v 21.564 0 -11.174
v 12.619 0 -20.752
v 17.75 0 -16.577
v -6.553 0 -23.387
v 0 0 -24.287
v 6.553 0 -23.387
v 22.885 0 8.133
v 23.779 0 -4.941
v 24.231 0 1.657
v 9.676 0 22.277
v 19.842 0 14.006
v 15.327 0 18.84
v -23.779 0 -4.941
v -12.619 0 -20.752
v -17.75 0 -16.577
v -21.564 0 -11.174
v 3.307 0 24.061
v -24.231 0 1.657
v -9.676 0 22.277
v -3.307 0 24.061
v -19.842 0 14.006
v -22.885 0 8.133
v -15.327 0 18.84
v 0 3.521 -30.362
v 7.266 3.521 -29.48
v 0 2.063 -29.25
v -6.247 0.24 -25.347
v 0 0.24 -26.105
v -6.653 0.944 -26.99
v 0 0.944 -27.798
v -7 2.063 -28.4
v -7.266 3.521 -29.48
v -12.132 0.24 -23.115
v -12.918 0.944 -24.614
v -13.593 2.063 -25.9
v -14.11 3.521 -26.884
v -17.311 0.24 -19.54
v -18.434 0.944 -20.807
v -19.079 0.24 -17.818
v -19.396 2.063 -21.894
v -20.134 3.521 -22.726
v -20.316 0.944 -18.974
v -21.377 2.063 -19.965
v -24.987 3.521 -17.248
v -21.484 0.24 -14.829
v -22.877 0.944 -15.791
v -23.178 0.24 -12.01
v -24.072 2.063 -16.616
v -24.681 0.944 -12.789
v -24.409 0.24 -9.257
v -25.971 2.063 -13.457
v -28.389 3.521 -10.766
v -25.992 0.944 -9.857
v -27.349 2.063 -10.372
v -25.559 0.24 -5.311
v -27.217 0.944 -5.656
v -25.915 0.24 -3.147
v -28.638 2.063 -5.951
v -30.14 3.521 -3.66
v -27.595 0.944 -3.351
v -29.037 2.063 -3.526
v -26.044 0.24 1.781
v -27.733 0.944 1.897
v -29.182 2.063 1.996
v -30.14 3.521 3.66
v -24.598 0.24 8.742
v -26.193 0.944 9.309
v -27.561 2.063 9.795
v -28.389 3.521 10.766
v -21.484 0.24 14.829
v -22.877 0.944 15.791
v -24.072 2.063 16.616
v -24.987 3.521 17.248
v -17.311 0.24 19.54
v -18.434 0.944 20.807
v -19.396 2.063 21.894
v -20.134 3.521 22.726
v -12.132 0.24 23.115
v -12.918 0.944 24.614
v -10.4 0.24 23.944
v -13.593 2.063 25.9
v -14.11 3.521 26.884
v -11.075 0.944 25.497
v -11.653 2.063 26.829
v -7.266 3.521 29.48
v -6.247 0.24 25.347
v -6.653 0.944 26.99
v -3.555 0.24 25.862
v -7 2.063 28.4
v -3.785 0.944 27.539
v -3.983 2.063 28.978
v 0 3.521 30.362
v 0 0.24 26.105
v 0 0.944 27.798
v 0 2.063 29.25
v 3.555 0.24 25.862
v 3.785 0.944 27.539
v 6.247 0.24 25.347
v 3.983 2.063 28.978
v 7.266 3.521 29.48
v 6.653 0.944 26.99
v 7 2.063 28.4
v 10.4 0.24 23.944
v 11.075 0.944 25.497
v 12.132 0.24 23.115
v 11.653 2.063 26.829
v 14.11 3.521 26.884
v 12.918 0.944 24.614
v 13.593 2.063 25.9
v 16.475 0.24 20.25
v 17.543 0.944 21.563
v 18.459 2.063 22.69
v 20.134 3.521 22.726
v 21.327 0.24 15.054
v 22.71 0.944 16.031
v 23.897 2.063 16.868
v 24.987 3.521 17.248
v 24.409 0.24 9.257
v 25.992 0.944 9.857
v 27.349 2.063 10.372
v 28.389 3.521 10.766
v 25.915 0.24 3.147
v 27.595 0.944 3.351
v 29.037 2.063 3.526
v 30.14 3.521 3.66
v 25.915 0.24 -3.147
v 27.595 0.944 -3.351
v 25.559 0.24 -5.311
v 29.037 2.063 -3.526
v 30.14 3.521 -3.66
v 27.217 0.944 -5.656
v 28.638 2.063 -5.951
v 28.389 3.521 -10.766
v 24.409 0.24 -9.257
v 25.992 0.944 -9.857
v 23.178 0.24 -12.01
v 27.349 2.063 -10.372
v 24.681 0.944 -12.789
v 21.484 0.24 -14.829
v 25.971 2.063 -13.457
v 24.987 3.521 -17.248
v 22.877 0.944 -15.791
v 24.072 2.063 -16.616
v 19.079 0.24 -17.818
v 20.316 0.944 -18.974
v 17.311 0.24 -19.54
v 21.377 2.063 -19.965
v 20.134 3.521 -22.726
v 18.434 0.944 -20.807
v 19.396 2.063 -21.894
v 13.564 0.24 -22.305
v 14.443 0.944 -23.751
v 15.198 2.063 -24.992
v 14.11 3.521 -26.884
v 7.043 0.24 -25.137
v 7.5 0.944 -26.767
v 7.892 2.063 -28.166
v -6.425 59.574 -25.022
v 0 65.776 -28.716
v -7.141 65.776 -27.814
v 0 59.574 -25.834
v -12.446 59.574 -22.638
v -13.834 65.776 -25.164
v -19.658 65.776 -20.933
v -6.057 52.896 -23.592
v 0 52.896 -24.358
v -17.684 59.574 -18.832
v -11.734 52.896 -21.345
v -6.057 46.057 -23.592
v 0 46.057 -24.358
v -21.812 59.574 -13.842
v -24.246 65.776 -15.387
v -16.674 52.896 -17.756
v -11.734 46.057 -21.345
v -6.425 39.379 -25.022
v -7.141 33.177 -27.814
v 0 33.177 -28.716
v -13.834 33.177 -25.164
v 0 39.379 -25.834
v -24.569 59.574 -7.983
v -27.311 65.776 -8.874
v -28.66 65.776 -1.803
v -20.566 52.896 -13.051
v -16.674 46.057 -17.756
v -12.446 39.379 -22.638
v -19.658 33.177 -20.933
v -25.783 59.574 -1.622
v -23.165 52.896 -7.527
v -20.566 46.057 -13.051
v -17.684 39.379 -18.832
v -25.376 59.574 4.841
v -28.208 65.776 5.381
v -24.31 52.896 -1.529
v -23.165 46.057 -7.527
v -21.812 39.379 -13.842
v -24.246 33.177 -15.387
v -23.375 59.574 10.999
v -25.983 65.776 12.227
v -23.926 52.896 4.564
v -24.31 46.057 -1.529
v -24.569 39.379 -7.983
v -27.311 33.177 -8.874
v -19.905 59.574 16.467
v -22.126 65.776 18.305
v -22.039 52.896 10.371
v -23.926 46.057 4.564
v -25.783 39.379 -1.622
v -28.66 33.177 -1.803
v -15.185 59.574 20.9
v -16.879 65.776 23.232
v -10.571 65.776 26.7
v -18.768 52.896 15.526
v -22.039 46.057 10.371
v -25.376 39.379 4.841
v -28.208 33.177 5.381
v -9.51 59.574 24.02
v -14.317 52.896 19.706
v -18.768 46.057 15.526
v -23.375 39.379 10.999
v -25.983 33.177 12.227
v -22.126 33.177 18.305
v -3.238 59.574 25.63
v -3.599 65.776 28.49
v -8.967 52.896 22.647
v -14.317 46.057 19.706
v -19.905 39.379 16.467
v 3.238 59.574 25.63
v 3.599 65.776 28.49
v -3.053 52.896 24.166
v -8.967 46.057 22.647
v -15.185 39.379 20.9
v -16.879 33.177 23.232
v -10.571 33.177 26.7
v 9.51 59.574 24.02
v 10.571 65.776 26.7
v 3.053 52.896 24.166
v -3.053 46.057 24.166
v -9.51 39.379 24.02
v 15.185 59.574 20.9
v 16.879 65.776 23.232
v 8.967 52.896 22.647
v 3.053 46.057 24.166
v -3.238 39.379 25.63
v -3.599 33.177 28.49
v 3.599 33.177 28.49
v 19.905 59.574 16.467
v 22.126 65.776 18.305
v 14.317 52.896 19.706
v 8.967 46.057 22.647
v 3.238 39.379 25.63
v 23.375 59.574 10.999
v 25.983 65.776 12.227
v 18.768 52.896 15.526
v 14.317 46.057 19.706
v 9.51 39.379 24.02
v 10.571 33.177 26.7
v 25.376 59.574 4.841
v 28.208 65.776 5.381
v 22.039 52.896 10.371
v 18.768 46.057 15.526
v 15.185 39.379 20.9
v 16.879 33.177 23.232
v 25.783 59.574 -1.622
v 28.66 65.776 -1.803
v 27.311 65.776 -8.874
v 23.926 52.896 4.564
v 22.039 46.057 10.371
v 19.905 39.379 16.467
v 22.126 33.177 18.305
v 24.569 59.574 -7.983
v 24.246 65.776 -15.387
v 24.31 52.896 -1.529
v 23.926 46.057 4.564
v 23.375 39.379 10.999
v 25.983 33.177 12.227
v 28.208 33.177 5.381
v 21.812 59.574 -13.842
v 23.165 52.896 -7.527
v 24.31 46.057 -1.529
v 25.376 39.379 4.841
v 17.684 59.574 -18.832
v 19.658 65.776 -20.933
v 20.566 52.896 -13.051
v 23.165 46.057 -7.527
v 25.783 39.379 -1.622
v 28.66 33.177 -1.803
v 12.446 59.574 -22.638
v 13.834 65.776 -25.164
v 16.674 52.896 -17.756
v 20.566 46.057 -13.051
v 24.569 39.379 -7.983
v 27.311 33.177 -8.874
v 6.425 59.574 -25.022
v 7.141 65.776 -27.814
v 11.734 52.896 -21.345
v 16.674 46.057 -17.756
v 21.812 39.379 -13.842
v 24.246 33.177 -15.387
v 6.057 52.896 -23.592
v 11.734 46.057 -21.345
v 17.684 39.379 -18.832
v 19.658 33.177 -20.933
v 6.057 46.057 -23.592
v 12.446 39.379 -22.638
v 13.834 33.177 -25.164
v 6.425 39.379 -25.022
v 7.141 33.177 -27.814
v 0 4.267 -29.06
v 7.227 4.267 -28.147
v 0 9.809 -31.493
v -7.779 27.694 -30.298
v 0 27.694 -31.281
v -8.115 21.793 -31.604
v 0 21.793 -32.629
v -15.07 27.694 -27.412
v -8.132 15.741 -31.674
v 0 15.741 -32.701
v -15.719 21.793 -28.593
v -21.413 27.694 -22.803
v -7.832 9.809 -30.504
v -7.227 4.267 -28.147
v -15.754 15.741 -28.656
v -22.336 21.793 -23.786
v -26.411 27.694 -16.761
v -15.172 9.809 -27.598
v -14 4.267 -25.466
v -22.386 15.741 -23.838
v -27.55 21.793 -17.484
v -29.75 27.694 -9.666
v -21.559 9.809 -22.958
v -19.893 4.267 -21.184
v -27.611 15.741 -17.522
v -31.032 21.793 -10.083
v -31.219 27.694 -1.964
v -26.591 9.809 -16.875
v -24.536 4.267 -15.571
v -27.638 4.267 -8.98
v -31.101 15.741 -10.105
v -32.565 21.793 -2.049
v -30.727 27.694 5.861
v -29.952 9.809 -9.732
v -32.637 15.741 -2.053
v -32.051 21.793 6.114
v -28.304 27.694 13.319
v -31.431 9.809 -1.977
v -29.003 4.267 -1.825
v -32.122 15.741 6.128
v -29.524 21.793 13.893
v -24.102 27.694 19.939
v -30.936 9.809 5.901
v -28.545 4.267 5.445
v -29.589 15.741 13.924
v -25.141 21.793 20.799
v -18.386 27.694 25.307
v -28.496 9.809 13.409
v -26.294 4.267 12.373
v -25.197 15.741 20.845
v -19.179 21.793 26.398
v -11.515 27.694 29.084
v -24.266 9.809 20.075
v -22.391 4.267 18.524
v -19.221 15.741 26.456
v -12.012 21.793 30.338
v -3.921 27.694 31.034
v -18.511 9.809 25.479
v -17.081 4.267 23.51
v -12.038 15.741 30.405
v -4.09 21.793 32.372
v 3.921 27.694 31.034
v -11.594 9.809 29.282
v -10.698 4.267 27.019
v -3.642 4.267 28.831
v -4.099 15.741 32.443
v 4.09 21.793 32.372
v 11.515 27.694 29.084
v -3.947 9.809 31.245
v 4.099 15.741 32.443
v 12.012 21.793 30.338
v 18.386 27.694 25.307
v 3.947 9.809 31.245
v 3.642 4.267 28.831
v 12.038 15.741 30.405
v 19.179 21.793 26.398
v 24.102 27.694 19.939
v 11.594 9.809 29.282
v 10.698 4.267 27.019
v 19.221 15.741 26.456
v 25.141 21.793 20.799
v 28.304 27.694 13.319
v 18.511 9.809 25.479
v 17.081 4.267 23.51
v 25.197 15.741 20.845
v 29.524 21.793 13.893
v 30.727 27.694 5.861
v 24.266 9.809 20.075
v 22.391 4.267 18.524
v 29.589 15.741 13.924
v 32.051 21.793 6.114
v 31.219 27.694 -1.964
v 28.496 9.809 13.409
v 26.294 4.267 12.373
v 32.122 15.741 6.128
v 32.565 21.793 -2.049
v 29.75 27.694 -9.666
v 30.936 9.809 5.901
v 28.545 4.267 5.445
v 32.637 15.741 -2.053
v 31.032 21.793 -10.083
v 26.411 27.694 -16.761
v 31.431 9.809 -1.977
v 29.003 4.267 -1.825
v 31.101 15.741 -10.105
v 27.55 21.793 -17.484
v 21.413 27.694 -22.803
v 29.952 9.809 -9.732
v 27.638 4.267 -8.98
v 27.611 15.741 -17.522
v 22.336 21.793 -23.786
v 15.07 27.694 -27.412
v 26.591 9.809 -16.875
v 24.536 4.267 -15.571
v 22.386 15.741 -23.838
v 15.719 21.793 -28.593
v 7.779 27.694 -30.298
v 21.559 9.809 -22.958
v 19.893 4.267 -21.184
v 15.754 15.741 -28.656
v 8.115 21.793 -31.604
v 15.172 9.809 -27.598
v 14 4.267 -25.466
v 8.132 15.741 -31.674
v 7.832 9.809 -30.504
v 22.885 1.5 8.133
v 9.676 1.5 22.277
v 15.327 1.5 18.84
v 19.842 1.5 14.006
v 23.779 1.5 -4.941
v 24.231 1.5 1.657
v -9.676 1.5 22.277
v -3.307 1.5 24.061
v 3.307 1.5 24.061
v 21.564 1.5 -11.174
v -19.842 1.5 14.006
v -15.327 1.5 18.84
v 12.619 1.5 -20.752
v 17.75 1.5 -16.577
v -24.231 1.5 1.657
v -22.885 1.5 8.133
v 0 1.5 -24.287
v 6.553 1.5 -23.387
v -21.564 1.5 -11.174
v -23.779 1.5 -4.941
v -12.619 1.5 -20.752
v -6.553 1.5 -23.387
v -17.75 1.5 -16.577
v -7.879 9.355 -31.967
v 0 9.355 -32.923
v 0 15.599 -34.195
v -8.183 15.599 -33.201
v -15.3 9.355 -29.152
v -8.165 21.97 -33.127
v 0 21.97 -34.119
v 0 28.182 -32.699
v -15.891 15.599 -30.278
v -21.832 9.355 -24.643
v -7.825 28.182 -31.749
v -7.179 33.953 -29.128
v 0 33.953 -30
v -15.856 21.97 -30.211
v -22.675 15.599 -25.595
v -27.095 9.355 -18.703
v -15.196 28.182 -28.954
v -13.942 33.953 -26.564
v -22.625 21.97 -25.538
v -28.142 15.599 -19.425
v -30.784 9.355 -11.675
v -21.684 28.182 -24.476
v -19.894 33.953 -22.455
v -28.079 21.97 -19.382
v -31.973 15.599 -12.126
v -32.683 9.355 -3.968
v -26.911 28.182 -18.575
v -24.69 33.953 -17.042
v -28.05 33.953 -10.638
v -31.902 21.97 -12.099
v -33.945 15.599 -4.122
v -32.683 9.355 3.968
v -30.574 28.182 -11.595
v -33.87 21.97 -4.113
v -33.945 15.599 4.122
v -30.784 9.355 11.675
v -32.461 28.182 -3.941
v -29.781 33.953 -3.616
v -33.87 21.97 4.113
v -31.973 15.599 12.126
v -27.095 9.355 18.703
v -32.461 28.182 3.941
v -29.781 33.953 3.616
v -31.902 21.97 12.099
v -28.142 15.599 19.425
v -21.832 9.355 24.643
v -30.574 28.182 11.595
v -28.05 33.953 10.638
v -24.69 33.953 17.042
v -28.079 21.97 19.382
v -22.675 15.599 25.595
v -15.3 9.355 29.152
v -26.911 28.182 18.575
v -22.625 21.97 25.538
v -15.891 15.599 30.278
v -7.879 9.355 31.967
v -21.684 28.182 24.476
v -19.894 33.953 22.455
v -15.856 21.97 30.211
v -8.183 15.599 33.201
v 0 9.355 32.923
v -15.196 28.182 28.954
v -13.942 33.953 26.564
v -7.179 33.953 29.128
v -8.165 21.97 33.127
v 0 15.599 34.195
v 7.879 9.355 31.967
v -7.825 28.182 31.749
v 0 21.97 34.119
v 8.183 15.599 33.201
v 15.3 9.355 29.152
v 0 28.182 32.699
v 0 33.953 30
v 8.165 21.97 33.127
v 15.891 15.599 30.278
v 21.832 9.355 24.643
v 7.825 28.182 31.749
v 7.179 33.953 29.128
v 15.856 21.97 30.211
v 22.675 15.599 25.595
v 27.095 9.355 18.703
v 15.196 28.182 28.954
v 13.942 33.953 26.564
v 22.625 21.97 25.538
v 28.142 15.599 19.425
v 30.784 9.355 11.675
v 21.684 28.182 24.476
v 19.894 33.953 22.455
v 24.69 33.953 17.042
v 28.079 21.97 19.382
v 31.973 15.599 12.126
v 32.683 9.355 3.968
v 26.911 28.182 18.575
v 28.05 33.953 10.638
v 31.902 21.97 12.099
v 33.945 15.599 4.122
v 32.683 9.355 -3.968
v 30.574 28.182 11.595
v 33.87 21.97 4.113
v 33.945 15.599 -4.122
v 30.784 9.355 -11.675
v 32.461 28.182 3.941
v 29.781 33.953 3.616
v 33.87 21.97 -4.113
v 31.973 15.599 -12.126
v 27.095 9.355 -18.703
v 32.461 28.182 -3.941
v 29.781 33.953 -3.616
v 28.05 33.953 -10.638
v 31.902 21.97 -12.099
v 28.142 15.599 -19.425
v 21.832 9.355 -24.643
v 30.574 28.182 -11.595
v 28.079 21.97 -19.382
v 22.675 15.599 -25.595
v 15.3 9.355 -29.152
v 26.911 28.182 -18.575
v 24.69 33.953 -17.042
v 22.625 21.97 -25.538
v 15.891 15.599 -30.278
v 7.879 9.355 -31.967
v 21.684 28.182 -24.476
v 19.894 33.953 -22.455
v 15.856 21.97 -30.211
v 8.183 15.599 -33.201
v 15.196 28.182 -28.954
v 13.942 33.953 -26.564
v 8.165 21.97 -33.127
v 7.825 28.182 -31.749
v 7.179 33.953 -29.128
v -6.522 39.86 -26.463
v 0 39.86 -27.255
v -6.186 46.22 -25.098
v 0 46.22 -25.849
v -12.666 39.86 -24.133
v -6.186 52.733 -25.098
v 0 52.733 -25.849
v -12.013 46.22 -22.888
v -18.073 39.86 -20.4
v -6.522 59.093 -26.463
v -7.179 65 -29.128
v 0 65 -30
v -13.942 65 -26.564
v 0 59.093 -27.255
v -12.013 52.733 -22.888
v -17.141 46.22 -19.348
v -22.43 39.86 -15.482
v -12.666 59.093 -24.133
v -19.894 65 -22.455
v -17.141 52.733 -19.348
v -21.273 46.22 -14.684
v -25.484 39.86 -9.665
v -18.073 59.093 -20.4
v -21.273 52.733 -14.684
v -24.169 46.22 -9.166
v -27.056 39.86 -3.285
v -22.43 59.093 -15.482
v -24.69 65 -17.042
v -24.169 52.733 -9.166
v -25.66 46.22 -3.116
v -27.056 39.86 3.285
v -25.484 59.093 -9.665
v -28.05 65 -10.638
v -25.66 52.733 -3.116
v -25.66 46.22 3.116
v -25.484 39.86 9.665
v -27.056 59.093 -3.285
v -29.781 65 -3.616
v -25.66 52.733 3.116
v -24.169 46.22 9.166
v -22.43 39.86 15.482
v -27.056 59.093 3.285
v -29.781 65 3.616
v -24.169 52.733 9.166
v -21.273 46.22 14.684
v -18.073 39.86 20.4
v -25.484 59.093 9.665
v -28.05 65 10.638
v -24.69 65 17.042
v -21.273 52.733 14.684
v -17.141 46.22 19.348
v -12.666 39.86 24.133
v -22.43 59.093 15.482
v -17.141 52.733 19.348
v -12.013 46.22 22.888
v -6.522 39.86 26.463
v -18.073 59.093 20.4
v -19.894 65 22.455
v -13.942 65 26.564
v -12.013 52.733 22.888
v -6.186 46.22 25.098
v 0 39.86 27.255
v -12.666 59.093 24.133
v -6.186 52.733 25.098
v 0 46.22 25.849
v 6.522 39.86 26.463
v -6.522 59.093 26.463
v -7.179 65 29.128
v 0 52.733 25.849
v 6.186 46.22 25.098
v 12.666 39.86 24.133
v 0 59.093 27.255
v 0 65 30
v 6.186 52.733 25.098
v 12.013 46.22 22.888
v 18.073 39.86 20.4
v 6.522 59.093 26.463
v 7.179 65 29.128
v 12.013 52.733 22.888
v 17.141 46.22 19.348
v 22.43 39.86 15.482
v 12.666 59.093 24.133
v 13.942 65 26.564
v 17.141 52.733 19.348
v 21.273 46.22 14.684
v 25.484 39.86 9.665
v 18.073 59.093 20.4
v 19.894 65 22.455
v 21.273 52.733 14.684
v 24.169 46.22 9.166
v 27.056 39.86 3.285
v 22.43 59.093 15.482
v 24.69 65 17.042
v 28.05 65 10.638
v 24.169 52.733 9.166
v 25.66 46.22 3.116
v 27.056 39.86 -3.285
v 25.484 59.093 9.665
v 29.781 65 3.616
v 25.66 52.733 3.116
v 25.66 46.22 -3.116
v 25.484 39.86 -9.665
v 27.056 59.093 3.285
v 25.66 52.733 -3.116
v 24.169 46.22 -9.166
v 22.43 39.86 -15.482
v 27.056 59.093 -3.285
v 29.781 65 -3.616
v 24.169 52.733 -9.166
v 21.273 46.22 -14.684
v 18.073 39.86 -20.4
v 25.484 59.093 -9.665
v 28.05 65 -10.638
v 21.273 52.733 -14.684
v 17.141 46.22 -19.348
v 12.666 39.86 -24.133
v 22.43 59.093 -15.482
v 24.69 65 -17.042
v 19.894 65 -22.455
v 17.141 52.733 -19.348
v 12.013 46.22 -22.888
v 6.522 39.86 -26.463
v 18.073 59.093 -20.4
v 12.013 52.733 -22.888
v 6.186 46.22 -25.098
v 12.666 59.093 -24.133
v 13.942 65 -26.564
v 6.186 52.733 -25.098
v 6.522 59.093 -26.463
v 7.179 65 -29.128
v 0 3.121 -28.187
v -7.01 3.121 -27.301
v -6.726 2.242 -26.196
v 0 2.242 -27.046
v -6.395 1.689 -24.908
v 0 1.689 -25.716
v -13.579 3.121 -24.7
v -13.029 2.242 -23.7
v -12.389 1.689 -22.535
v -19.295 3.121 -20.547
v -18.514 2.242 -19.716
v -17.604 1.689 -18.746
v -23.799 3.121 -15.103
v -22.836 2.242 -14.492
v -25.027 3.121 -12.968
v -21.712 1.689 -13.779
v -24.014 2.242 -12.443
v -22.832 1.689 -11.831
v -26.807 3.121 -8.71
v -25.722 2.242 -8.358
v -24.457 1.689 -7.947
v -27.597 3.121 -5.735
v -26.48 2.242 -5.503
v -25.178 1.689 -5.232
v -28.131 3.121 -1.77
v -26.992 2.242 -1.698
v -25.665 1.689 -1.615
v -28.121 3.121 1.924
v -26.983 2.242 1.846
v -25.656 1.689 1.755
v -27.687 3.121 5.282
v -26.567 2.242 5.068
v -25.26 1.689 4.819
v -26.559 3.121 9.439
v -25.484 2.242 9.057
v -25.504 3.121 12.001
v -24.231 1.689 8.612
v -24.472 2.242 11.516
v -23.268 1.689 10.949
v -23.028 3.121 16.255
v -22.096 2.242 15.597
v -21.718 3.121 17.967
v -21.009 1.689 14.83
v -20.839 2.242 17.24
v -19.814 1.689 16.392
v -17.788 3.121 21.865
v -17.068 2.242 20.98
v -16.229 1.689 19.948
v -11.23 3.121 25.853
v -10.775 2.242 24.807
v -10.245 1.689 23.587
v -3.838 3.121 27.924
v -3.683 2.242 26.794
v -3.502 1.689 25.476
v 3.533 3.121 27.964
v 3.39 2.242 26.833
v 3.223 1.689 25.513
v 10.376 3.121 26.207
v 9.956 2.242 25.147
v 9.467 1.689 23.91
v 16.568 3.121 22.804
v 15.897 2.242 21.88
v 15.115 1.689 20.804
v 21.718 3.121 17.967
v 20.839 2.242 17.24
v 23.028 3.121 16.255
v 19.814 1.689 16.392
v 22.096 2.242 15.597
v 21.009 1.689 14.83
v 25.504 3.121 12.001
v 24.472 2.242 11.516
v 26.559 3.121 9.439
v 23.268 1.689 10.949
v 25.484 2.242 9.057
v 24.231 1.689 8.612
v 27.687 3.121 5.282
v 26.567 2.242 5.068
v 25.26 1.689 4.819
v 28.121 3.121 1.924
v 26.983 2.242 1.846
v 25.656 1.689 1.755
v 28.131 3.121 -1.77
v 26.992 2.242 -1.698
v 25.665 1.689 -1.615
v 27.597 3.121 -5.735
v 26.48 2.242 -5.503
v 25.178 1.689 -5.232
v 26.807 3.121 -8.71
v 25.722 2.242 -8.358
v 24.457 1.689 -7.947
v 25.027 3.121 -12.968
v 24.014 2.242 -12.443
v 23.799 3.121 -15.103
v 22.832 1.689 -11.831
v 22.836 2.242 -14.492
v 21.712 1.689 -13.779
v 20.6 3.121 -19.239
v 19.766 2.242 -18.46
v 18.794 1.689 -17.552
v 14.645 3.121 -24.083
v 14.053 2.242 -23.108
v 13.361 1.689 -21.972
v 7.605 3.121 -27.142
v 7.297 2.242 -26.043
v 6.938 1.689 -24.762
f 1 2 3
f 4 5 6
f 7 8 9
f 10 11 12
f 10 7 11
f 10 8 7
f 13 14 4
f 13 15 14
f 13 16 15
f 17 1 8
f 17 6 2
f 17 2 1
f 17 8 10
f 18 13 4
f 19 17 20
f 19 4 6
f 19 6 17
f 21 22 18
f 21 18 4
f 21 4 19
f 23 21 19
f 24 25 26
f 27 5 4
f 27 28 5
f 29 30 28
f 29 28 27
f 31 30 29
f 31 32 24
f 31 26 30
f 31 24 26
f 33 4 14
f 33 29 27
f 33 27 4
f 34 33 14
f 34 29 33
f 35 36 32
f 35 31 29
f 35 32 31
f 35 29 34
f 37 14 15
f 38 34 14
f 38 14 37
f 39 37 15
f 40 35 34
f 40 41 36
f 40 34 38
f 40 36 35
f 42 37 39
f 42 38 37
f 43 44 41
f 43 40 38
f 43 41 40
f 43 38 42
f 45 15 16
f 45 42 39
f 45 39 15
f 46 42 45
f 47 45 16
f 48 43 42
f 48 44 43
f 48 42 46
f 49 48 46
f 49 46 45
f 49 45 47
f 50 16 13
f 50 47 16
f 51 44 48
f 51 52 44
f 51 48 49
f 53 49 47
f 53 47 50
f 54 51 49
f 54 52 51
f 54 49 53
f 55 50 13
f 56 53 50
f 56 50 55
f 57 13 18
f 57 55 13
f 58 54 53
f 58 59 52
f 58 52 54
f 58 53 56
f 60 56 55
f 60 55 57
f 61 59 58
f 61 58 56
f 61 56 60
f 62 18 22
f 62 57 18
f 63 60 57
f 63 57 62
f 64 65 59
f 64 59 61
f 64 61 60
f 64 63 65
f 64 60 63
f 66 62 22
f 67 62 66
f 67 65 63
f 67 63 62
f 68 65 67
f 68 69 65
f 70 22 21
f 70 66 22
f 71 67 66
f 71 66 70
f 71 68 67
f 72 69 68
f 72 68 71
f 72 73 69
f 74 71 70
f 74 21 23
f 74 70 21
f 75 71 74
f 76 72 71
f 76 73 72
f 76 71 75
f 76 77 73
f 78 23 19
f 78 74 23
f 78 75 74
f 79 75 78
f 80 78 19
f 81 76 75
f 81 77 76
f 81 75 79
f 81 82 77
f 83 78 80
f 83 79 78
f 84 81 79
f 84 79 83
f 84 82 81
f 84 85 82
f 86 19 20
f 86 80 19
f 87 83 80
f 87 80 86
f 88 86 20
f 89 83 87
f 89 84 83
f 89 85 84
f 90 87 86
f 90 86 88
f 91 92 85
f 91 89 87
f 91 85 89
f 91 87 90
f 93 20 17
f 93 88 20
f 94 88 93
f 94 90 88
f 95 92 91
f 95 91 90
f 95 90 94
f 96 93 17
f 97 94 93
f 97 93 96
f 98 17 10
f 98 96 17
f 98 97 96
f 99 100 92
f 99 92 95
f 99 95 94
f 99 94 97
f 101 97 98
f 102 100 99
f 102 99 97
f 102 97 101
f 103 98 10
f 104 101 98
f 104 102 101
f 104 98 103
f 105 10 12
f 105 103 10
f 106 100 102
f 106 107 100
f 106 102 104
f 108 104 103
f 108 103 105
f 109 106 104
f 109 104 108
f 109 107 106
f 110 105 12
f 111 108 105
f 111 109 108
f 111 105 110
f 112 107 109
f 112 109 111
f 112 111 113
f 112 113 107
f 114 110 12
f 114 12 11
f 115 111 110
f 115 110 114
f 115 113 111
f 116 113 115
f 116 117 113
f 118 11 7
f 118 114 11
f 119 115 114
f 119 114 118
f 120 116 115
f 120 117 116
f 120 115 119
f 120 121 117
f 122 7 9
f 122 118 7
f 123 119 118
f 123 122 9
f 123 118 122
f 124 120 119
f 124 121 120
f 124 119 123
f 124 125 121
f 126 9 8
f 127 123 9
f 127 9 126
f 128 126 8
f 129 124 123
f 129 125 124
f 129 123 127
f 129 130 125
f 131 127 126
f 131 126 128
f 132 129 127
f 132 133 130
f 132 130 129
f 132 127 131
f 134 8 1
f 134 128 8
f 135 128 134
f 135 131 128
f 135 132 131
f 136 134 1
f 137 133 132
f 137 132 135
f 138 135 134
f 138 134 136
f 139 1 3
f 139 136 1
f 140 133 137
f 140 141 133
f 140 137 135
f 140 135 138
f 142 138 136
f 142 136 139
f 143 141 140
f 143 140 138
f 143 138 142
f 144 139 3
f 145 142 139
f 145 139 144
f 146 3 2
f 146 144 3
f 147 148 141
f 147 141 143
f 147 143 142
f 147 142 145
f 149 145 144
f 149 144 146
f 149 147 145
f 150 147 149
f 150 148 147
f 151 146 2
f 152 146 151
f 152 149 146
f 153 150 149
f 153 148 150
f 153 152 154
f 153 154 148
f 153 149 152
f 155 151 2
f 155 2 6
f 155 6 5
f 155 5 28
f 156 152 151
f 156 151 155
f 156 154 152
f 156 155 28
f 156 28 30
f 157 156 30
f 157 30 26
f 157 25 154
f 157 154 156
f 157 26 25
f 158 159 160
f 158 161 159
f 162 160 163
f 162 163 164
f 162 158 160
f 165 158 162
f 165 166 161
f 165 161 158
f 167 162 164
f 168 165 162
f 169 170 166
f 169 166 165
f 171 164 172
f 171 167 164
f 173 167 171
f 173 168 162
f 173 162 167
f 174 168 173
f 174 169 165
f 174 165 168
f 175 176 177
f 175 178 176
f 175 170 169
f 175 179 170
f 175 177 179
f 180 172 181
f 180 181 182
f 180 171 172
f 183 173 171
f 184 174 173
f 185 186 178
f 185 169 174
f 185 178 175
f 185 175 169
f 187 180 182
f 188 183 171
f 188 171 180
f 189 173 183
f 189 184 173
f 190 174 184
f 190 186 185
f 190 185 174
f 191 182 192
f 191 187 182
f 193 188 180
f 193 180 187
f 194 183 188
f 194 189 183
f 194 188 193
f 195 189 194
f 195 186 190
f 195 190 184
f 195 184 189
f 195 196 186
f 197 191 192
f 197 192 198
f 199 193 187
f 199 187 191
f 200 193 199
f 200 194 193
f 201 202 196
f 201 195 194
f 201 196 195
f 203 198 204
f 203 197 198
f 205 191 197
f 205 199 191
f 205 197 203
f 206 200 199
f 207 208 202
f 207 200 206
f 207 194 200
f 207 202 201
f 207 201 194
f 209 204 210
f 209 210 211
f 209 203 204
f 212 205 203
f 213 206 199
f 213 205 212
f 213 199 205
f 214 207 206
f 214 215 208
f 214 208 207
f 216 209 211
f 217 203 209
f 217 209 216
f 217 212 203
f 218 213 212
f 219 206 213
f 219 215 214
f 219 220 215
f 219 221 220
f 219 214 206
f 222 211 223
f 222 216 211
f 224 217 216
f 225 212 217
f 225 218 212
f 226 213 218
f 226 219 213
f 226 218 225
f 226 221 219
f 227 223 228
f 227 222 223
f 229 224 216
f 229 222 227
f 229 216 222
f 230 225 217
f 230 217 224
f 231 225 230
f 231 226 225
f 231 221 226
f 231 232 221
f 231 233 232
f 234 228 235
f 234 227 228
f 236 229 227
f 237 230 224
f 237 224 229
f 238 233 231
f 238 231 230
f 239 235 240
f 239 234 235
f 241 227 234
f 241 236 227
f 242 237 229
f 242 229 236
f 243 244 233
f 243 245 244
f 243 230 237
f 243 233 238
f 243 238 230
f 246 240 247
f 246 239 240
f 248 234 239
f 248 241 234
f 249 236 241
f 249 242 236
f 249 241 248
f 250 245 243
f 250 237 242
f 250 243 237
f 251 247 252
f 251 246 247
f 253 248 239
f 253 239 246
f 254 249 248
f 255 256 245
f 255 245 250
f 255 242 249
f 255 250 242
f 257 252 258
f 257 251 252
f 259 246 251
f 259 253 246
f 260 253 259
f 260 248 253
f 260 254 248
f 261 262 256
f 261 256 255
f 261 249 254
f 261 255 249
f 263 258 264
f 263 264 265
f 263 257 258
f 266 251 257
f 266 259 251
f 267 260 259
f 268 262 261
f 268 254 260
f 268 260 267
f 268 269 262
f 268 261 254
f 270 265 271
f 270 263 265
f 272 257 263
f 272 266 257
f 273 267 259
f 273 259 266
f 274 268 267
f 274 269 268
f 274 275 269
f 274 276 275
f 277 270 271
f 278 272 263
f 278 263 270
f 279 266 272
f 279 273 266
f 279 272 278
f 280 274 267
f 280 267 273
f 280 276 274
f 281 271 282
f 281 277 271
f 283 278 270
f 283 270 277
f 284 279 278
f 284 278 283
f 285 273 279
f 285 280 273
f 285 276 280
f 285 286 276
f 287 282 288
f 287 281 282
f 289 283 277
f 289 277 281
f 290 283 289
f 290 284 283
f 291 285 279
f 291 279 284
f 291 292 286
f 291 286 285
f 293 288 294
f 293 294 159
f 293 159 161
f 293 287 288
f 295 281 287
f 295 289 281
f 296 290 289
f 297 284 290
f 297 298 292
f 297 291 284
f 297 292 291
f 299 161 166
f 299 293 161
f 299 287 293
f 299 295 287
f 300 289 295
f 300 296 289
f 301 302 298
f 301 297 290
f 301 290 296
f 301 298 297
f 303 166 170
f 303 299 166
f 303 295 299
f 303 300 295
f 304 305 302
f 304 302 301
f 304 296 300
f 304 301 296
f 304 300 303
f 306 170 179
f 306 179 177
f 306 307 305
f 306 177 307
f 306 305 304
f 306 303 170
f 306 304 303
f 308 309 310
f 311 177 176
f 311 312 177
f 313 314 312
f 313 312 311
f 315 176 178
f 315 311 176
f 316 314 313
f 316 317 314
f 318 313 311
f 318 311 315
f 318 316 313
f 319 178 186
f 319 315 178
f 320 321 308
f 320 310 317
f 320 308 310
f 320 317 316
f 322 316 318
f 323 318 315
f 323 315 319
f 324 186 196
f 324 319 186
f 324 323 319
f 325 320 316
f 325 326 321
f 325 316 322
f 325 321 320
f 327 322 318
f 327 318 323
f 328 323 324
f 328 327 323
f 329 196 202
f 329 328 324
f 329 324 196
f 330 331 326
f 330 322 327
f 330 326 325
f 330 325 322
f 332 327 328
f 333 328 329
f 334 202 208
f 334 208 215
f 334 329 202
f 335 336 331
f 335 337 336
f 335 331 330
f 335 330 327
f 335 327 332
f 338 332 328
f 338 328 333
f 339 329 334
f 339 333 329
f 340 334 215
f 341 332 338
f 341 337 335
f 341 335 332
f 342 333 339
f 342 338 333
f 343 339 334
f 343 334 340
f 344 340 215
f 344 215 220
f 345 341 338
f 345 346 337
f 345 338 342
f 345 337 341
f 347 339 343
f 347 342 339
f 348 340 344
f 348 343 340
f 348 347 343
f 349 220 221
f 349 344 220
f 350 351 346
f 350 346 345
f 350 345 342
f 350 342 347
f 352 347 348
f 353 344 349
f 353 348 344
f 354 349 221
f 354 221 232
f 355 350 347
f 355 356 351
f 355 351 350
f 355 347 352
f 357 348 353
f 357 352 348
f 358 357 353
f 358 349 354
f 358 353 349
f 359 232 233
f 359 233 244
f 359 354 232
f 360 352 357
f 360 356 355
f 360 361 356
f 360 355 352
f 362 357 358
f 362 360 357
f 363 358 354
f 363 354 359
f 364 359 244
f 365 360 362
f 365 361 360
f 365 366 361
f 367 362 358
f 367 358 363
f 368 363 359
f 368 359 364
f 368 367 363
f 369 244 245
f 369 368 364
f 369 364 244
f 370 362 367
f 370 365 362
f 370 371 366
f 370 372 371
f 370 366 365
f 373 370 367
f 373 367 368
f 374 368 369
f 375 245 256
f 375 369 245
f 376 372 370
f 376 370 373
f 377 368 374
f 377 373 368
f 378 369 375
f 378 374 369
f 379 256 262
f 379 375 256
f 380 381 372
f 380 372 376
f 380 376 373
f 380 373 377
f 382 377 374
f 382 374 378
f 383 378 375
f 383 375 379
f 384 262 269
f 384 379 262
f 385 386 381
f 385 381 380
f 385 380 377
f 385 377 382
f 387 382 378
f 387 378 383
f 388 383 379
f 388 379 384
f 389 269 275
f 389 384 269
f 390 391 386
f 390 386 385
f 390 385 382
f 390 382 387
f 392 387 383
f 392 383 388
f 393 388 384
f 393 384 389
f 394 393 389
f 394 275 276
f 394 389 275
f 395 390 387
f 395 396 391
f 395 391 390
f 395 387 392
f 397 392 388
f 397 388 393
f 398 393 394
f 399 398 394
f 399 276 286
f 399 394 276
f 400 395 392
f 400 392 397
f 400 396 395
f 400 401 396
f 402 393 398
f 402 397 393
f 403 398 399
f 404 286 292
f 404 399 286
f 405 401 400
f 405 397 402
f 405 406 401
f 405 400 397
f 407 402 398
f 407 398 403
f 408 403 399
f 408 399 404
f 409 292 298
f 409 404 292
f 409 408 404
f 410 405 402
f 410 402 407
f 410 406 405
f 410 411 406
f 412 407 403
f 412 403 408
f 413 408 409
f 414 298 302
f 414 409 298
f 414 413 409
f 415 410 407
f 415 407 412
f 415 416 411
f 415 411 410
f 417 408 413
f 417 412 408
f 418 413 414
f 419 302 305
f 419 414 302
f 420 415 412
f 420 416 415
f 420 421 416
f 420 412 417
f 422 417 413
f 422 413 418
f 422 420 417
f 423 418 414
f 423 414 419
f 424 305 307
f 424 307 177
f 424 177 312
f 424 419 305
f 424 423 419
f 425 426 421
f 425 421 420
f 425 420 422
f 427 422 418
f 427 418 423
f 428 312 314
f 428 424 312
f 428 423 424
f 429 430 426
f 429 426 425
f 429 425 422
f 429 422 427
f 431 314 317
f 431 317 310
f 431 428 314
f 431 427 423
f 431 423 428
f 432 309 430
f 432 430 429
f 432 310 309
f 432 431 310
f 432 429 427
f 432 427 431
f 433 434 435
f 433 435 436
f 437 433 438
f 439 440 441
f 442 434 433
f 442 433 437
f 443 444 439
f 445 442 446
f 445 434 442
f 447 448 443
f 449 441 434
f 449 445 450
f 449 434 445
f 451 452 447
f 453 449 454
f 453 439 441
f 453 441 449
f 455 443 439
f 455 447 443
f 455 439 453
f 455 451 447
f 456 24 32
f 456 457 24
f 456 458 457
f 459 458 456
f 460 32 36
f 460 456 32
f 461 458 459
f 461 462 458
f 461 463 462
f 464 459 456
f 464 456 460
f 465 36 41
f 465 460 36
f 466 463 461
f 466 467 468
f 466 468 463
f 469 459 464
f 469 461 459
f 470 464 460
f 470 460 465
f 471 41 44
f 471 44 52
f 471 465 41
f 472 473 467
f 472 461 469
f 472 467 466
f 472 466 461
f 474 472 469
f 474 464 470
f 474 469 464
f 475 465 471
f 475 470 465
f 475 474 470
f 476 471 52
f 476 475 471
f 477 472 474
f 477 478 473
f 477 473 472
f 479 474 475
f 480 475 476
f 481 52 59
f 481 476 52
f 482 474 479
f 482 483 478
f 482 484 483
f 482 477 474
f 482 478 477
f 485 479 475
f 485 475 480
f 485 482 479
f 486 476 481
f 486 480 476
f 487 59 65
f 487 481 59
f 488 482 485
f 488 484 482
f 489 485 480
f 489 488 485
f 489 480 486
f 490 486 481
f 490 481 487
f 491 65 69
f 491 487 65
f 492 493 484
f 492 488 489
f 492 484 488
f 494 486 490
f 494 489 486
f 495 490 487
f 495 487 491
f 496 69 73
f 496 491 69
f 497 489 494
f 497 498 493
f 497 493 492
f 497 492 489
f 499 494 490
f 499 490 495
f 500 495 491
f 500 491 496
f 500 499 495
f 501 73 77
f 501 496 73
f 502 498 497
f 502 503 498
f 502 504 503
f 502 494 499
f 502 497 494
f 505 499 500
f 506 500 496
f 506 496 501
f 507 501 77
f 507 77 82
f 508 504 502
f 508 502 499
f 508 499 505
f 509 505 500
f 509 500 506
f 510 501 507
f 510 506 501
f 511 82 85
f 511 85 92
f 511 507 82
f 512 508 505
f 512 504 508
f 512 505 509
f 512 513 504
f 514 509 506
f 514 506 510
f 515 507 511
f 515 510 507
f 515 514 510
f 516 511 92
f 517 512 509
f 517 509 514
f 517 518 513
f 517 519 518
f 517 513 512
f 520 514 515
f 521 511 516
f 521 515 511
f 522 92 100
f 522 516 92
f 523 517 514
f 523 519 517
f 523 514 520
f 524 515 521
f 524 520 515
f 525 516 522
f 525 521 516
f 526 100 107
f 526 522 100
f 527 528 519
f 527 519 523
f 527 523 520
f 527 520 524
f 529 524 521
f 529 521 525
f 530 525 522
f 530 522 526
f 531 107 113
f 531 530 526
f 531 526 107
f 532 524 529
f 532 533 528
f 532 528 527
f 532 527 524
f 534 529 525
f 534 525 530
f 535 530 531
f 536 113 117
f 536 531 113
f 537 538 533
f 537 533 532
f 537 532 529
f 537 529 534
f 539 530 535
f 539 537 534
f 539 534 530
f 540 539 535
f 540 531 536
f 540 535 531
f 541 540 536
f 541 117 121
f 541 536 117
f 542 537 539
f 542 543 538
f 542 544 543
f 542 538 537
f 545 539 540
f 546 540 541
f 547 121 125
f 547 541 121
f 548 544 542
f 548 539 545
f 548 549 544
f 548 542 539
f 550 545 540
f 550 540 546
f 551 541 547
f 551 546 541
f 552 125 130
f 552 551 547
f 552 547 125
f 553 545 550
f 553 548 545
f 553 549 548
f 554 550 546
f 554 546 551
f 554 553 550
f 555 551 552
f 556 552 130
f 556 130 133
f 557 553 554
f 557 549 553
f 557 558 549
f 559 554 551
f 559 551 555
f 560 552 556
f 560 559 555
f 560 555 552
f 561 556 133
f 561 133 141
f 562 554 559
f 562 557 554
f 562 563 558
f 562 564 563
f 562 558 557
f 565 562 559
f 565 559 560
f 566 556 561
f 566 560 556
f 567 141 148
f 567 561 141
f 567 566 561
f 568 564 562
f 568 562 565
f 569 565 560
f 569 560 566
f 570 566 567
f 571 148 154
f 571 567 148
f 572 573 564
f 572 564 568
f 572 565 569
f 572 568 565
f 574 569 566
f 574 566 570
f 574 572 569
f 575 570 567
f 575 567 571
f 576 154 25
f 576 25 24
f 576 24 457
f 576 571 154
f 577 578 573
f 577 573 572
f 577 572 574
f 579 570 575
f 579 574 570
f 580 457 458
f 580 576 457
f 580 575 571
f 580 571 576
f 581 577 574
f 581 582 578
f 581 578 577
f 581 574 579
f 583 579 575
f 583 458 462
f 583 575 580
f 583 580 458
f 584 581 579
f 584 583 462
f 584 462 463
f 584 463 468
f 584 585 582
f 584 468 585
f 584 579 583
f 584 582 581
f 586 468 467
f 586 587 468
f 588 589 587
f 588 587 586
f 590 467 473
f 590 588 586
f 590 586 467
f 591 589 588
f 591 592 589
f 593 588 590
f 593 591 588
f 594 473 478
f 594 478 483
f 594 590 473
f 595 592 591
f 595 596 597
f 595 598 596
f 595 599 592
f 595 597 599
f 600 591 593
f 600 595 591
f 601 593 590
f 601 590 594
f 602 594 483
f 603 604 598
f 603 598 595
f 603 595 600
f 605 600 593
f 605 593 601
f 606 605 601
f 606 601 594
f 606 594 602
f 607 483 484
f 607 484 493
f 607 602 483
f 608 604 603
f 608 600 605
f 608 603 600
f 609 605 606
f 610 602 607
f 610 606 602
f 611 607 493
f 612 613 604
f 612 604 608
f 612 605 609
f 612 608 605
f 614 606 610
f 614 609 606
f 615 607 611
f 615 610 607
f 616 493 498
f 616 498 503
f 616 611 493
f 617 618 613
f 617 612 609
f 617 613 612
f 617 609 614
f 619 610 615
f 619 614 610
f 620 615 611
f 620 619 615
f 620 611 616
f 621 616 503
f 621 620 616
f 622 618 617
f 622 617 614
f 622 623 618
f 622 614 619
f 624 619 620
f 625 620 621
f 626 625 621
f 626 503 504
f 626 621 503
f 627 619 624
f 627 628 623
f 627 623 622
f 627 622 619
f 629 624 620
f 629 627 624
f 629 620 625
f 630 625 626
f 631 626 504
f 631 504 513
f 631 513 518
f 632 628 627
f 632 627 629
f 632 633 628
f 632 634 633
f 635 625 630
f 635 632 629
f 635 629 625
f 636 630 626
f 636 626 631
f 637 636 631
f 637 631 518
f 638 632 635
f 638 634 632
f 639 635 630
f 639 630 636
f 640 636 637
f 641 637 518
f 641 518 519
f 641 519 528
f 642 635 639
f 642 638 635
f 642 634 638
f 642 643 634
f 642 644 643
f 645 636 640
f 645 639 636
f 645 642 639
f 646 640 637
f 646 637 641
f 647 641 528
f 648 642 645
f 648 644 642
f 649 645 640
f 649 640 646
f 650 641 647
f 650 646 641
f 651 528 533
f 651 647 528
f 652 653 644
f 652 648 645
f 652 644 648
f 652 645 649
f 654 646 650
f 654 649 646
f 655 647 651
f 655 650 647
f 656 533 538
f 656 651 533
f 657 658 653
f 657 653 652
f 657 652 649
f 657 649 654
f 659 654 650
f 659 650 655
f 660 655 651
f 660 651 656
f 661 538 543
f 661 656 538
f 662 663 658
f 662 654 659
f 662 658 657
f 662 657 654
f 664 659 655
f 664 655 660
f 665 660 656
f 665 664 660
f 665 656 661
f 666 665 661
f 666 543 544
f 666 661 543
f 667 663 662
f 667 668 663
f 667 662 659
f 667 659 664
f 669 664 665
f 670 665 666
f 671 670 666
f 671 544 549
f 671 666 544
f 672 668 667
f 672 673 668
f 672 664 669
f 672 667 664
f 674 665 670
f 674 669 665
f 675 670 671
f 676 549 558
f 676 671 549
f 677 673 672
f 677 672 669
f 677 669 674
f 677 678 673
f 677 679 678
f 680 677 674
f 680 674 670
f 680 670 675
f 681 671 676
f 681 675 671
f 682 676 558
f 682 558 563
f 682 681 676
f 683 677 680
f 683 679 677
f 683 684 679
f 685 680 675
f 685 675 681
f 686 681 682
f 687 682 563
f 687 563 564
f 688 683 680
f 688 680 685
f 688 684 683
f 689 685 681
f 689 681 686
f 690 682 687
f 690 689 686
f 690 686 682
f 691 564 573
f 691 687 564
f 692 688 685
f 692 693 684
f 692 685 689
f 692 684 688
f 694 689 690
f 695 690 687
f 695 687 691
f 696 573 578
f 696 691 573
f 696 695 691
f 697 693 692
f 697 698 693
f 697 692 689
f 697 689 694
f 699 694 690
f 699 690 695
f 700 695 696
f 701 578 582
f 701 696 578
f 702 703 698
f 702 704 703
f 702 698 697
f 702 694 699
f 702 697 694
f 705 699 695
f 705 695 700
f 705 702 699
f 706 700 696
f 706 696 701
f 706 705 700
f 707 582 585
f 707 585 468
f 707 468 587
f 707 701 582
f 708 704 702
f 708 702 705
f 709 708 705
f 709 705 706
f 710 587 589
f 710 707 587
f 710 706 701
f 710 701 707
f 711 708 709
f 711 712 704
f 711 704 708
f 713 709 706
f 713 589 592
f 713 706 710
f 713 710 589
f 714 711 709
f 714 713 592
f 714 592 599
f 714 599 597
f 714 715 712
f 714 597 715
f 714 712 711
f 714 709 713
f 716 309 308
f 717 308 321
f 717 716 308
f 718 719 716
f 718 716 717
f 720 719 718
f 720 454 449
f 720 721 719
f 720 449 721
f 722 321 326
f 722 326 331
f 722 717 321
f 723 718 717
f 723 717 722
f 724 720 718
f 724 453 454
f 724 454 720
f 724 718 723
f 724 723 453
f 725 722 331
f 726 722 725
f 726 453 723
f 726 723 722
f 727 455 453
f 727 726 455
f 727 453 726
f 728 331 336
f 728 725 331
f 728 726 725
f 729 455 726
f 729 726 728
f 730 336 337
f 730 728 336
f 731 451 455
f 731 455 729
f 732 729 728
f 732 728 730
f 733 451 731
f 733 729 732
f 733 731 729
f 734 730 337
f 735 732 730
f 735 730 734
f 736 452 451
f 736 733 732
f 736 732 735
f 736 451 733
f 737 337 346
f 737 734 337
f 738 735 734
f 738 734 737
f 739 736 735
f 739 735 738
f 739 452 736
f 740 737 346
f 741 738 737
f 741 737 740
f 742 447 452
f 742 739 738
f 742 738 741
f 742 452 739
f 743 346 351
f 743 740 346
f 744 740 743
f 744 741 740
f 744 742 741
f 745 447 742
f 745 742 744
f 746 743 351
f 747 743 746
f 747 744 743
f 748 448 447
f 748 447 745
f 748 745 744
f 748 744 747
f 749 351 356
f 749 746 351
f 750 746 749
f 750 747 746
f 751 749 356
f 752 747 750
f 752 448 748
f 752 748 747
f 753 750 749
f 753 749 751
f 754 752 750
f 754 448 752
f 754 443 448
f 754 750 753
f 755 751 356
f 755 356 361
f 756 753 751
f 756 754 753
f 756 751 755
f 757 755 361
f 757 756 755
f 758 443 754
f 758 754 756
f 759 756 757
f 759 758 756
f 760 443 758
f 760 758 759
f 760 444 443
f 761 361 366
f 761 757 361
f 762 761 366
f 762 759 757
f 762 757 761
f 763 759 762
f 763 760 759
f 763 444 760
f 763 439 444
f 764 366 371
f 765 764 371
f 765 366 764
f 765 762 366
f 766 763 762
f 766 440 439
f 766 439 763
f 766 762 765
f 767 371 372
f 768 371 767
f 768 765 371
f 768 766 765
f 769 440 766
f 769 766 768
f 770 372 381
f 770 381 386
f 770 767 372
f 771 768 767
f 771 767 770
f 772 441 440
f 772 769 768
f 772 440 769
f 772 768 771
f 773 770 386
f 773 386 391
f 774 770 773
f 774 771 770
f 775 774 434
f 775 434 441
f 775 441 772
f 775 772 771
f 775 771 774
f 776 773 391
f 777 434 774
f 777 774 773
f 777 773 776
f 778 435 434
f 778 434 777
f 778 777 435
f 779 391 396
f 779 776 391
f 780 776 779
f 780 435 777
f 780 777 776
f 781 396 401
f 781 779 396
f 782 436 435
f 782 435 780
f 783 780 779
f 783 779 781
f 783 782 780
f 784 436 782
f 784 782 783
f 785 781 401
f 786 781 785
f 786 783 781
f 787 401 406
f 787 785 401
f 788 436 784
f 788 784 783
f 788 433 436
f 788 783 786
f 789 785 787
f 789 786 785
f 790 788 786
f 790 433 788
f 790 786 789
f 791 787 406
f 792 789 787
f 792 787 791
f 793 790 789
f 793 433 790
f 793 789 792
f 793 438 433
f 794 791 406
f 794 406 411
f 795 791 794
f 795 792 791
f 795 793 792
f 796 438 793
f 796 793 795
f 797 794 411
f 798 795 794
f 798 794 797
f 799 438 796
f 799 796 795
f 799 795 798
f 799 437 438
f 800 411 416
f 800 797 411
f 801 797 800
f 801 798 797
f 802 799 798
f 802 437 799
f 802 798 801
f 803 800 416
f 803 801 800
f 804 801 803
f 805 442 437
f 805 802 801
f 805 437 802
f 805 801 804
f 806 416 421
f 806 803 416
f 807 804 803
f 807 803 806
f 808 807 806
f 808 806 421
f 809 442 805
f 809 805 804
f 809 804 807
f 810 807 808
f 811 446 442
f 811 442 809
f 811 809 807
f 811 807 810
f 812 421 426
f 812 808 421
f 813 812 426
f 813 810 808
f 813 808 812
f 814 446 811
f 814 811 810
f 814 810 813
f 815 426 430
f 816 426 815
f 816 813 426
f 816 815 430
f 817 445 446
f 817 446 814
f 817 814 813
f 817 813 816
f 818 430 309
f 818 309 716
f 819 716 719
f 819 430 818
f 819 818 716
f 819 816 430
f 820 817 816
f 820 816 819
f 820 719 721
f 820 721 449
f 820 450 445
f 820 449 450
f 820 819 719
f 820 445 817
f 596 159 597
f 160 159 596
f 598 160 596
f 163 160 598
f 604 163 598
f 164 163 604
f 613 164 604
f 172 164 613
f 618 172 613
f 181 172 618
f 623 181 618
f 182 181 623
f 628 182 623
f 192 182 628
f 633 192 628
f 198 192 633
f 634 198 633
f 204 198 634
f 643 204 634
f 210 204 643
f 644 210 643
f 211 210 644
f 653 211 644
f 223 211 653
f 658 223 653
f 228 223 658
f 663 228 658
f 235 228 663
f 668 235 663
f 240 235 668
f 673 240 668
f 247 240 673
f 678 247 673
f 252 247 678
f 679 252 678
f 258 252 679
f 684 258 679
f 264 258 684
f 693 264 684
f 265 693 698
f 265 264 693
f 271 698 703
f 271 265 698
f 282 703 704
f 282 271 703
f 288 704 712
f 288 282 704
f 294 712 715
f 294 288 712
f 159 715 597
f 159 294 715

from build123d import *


with BuildPart() as part:
    # Sketch1 → Revolve-Thin1 (revolve)
    with BuildSketch(Plane.XY, mode=Mode.PRIVATE) as revolve_thin1_sk:
        with BuildLine():
            Line((0, 0), (24.287414571, 0))
            ThreePointArc((24.287414571, 0), (27.798066951, 0.943984819), (30.361861458, 3.521337181))
            ThreePointArc((30.361861458, 3.521337181), (34.326396995, 18.786592416), (30, 33.953261414))
            ThreePointArc((30, 33.953261414), (25.671482345, 49.476630707), (30, 65))
            Line((30, 65), (28.716425883, 65.776168465))
            ThreePointArc((28.716425883, 65.776168465), (24.171482345, 49.476630707), (28.716425883, 33.177092949))
            ThreePointArc((28.716425883, 33.177092949), (32.826503028, 18.768757402), (29.060194268, 4.266764928))
            ThreePointArc((29.060194268, 4.266764928), (27.045784298, 2.241702358), (24.287414571, 1.5))
            Line((24.287414571, 1.5), (0, 1.5))
            Line((0, 1.5), (0, 0))
        make_face()
    revolve(revolve_thin1_sk.sketch.rotate(Axis((0, 0, 0), (0, 1, 0)), 90), axis=Axis((0, 0, 0), (0, 1, 0)))


solid = part.part
